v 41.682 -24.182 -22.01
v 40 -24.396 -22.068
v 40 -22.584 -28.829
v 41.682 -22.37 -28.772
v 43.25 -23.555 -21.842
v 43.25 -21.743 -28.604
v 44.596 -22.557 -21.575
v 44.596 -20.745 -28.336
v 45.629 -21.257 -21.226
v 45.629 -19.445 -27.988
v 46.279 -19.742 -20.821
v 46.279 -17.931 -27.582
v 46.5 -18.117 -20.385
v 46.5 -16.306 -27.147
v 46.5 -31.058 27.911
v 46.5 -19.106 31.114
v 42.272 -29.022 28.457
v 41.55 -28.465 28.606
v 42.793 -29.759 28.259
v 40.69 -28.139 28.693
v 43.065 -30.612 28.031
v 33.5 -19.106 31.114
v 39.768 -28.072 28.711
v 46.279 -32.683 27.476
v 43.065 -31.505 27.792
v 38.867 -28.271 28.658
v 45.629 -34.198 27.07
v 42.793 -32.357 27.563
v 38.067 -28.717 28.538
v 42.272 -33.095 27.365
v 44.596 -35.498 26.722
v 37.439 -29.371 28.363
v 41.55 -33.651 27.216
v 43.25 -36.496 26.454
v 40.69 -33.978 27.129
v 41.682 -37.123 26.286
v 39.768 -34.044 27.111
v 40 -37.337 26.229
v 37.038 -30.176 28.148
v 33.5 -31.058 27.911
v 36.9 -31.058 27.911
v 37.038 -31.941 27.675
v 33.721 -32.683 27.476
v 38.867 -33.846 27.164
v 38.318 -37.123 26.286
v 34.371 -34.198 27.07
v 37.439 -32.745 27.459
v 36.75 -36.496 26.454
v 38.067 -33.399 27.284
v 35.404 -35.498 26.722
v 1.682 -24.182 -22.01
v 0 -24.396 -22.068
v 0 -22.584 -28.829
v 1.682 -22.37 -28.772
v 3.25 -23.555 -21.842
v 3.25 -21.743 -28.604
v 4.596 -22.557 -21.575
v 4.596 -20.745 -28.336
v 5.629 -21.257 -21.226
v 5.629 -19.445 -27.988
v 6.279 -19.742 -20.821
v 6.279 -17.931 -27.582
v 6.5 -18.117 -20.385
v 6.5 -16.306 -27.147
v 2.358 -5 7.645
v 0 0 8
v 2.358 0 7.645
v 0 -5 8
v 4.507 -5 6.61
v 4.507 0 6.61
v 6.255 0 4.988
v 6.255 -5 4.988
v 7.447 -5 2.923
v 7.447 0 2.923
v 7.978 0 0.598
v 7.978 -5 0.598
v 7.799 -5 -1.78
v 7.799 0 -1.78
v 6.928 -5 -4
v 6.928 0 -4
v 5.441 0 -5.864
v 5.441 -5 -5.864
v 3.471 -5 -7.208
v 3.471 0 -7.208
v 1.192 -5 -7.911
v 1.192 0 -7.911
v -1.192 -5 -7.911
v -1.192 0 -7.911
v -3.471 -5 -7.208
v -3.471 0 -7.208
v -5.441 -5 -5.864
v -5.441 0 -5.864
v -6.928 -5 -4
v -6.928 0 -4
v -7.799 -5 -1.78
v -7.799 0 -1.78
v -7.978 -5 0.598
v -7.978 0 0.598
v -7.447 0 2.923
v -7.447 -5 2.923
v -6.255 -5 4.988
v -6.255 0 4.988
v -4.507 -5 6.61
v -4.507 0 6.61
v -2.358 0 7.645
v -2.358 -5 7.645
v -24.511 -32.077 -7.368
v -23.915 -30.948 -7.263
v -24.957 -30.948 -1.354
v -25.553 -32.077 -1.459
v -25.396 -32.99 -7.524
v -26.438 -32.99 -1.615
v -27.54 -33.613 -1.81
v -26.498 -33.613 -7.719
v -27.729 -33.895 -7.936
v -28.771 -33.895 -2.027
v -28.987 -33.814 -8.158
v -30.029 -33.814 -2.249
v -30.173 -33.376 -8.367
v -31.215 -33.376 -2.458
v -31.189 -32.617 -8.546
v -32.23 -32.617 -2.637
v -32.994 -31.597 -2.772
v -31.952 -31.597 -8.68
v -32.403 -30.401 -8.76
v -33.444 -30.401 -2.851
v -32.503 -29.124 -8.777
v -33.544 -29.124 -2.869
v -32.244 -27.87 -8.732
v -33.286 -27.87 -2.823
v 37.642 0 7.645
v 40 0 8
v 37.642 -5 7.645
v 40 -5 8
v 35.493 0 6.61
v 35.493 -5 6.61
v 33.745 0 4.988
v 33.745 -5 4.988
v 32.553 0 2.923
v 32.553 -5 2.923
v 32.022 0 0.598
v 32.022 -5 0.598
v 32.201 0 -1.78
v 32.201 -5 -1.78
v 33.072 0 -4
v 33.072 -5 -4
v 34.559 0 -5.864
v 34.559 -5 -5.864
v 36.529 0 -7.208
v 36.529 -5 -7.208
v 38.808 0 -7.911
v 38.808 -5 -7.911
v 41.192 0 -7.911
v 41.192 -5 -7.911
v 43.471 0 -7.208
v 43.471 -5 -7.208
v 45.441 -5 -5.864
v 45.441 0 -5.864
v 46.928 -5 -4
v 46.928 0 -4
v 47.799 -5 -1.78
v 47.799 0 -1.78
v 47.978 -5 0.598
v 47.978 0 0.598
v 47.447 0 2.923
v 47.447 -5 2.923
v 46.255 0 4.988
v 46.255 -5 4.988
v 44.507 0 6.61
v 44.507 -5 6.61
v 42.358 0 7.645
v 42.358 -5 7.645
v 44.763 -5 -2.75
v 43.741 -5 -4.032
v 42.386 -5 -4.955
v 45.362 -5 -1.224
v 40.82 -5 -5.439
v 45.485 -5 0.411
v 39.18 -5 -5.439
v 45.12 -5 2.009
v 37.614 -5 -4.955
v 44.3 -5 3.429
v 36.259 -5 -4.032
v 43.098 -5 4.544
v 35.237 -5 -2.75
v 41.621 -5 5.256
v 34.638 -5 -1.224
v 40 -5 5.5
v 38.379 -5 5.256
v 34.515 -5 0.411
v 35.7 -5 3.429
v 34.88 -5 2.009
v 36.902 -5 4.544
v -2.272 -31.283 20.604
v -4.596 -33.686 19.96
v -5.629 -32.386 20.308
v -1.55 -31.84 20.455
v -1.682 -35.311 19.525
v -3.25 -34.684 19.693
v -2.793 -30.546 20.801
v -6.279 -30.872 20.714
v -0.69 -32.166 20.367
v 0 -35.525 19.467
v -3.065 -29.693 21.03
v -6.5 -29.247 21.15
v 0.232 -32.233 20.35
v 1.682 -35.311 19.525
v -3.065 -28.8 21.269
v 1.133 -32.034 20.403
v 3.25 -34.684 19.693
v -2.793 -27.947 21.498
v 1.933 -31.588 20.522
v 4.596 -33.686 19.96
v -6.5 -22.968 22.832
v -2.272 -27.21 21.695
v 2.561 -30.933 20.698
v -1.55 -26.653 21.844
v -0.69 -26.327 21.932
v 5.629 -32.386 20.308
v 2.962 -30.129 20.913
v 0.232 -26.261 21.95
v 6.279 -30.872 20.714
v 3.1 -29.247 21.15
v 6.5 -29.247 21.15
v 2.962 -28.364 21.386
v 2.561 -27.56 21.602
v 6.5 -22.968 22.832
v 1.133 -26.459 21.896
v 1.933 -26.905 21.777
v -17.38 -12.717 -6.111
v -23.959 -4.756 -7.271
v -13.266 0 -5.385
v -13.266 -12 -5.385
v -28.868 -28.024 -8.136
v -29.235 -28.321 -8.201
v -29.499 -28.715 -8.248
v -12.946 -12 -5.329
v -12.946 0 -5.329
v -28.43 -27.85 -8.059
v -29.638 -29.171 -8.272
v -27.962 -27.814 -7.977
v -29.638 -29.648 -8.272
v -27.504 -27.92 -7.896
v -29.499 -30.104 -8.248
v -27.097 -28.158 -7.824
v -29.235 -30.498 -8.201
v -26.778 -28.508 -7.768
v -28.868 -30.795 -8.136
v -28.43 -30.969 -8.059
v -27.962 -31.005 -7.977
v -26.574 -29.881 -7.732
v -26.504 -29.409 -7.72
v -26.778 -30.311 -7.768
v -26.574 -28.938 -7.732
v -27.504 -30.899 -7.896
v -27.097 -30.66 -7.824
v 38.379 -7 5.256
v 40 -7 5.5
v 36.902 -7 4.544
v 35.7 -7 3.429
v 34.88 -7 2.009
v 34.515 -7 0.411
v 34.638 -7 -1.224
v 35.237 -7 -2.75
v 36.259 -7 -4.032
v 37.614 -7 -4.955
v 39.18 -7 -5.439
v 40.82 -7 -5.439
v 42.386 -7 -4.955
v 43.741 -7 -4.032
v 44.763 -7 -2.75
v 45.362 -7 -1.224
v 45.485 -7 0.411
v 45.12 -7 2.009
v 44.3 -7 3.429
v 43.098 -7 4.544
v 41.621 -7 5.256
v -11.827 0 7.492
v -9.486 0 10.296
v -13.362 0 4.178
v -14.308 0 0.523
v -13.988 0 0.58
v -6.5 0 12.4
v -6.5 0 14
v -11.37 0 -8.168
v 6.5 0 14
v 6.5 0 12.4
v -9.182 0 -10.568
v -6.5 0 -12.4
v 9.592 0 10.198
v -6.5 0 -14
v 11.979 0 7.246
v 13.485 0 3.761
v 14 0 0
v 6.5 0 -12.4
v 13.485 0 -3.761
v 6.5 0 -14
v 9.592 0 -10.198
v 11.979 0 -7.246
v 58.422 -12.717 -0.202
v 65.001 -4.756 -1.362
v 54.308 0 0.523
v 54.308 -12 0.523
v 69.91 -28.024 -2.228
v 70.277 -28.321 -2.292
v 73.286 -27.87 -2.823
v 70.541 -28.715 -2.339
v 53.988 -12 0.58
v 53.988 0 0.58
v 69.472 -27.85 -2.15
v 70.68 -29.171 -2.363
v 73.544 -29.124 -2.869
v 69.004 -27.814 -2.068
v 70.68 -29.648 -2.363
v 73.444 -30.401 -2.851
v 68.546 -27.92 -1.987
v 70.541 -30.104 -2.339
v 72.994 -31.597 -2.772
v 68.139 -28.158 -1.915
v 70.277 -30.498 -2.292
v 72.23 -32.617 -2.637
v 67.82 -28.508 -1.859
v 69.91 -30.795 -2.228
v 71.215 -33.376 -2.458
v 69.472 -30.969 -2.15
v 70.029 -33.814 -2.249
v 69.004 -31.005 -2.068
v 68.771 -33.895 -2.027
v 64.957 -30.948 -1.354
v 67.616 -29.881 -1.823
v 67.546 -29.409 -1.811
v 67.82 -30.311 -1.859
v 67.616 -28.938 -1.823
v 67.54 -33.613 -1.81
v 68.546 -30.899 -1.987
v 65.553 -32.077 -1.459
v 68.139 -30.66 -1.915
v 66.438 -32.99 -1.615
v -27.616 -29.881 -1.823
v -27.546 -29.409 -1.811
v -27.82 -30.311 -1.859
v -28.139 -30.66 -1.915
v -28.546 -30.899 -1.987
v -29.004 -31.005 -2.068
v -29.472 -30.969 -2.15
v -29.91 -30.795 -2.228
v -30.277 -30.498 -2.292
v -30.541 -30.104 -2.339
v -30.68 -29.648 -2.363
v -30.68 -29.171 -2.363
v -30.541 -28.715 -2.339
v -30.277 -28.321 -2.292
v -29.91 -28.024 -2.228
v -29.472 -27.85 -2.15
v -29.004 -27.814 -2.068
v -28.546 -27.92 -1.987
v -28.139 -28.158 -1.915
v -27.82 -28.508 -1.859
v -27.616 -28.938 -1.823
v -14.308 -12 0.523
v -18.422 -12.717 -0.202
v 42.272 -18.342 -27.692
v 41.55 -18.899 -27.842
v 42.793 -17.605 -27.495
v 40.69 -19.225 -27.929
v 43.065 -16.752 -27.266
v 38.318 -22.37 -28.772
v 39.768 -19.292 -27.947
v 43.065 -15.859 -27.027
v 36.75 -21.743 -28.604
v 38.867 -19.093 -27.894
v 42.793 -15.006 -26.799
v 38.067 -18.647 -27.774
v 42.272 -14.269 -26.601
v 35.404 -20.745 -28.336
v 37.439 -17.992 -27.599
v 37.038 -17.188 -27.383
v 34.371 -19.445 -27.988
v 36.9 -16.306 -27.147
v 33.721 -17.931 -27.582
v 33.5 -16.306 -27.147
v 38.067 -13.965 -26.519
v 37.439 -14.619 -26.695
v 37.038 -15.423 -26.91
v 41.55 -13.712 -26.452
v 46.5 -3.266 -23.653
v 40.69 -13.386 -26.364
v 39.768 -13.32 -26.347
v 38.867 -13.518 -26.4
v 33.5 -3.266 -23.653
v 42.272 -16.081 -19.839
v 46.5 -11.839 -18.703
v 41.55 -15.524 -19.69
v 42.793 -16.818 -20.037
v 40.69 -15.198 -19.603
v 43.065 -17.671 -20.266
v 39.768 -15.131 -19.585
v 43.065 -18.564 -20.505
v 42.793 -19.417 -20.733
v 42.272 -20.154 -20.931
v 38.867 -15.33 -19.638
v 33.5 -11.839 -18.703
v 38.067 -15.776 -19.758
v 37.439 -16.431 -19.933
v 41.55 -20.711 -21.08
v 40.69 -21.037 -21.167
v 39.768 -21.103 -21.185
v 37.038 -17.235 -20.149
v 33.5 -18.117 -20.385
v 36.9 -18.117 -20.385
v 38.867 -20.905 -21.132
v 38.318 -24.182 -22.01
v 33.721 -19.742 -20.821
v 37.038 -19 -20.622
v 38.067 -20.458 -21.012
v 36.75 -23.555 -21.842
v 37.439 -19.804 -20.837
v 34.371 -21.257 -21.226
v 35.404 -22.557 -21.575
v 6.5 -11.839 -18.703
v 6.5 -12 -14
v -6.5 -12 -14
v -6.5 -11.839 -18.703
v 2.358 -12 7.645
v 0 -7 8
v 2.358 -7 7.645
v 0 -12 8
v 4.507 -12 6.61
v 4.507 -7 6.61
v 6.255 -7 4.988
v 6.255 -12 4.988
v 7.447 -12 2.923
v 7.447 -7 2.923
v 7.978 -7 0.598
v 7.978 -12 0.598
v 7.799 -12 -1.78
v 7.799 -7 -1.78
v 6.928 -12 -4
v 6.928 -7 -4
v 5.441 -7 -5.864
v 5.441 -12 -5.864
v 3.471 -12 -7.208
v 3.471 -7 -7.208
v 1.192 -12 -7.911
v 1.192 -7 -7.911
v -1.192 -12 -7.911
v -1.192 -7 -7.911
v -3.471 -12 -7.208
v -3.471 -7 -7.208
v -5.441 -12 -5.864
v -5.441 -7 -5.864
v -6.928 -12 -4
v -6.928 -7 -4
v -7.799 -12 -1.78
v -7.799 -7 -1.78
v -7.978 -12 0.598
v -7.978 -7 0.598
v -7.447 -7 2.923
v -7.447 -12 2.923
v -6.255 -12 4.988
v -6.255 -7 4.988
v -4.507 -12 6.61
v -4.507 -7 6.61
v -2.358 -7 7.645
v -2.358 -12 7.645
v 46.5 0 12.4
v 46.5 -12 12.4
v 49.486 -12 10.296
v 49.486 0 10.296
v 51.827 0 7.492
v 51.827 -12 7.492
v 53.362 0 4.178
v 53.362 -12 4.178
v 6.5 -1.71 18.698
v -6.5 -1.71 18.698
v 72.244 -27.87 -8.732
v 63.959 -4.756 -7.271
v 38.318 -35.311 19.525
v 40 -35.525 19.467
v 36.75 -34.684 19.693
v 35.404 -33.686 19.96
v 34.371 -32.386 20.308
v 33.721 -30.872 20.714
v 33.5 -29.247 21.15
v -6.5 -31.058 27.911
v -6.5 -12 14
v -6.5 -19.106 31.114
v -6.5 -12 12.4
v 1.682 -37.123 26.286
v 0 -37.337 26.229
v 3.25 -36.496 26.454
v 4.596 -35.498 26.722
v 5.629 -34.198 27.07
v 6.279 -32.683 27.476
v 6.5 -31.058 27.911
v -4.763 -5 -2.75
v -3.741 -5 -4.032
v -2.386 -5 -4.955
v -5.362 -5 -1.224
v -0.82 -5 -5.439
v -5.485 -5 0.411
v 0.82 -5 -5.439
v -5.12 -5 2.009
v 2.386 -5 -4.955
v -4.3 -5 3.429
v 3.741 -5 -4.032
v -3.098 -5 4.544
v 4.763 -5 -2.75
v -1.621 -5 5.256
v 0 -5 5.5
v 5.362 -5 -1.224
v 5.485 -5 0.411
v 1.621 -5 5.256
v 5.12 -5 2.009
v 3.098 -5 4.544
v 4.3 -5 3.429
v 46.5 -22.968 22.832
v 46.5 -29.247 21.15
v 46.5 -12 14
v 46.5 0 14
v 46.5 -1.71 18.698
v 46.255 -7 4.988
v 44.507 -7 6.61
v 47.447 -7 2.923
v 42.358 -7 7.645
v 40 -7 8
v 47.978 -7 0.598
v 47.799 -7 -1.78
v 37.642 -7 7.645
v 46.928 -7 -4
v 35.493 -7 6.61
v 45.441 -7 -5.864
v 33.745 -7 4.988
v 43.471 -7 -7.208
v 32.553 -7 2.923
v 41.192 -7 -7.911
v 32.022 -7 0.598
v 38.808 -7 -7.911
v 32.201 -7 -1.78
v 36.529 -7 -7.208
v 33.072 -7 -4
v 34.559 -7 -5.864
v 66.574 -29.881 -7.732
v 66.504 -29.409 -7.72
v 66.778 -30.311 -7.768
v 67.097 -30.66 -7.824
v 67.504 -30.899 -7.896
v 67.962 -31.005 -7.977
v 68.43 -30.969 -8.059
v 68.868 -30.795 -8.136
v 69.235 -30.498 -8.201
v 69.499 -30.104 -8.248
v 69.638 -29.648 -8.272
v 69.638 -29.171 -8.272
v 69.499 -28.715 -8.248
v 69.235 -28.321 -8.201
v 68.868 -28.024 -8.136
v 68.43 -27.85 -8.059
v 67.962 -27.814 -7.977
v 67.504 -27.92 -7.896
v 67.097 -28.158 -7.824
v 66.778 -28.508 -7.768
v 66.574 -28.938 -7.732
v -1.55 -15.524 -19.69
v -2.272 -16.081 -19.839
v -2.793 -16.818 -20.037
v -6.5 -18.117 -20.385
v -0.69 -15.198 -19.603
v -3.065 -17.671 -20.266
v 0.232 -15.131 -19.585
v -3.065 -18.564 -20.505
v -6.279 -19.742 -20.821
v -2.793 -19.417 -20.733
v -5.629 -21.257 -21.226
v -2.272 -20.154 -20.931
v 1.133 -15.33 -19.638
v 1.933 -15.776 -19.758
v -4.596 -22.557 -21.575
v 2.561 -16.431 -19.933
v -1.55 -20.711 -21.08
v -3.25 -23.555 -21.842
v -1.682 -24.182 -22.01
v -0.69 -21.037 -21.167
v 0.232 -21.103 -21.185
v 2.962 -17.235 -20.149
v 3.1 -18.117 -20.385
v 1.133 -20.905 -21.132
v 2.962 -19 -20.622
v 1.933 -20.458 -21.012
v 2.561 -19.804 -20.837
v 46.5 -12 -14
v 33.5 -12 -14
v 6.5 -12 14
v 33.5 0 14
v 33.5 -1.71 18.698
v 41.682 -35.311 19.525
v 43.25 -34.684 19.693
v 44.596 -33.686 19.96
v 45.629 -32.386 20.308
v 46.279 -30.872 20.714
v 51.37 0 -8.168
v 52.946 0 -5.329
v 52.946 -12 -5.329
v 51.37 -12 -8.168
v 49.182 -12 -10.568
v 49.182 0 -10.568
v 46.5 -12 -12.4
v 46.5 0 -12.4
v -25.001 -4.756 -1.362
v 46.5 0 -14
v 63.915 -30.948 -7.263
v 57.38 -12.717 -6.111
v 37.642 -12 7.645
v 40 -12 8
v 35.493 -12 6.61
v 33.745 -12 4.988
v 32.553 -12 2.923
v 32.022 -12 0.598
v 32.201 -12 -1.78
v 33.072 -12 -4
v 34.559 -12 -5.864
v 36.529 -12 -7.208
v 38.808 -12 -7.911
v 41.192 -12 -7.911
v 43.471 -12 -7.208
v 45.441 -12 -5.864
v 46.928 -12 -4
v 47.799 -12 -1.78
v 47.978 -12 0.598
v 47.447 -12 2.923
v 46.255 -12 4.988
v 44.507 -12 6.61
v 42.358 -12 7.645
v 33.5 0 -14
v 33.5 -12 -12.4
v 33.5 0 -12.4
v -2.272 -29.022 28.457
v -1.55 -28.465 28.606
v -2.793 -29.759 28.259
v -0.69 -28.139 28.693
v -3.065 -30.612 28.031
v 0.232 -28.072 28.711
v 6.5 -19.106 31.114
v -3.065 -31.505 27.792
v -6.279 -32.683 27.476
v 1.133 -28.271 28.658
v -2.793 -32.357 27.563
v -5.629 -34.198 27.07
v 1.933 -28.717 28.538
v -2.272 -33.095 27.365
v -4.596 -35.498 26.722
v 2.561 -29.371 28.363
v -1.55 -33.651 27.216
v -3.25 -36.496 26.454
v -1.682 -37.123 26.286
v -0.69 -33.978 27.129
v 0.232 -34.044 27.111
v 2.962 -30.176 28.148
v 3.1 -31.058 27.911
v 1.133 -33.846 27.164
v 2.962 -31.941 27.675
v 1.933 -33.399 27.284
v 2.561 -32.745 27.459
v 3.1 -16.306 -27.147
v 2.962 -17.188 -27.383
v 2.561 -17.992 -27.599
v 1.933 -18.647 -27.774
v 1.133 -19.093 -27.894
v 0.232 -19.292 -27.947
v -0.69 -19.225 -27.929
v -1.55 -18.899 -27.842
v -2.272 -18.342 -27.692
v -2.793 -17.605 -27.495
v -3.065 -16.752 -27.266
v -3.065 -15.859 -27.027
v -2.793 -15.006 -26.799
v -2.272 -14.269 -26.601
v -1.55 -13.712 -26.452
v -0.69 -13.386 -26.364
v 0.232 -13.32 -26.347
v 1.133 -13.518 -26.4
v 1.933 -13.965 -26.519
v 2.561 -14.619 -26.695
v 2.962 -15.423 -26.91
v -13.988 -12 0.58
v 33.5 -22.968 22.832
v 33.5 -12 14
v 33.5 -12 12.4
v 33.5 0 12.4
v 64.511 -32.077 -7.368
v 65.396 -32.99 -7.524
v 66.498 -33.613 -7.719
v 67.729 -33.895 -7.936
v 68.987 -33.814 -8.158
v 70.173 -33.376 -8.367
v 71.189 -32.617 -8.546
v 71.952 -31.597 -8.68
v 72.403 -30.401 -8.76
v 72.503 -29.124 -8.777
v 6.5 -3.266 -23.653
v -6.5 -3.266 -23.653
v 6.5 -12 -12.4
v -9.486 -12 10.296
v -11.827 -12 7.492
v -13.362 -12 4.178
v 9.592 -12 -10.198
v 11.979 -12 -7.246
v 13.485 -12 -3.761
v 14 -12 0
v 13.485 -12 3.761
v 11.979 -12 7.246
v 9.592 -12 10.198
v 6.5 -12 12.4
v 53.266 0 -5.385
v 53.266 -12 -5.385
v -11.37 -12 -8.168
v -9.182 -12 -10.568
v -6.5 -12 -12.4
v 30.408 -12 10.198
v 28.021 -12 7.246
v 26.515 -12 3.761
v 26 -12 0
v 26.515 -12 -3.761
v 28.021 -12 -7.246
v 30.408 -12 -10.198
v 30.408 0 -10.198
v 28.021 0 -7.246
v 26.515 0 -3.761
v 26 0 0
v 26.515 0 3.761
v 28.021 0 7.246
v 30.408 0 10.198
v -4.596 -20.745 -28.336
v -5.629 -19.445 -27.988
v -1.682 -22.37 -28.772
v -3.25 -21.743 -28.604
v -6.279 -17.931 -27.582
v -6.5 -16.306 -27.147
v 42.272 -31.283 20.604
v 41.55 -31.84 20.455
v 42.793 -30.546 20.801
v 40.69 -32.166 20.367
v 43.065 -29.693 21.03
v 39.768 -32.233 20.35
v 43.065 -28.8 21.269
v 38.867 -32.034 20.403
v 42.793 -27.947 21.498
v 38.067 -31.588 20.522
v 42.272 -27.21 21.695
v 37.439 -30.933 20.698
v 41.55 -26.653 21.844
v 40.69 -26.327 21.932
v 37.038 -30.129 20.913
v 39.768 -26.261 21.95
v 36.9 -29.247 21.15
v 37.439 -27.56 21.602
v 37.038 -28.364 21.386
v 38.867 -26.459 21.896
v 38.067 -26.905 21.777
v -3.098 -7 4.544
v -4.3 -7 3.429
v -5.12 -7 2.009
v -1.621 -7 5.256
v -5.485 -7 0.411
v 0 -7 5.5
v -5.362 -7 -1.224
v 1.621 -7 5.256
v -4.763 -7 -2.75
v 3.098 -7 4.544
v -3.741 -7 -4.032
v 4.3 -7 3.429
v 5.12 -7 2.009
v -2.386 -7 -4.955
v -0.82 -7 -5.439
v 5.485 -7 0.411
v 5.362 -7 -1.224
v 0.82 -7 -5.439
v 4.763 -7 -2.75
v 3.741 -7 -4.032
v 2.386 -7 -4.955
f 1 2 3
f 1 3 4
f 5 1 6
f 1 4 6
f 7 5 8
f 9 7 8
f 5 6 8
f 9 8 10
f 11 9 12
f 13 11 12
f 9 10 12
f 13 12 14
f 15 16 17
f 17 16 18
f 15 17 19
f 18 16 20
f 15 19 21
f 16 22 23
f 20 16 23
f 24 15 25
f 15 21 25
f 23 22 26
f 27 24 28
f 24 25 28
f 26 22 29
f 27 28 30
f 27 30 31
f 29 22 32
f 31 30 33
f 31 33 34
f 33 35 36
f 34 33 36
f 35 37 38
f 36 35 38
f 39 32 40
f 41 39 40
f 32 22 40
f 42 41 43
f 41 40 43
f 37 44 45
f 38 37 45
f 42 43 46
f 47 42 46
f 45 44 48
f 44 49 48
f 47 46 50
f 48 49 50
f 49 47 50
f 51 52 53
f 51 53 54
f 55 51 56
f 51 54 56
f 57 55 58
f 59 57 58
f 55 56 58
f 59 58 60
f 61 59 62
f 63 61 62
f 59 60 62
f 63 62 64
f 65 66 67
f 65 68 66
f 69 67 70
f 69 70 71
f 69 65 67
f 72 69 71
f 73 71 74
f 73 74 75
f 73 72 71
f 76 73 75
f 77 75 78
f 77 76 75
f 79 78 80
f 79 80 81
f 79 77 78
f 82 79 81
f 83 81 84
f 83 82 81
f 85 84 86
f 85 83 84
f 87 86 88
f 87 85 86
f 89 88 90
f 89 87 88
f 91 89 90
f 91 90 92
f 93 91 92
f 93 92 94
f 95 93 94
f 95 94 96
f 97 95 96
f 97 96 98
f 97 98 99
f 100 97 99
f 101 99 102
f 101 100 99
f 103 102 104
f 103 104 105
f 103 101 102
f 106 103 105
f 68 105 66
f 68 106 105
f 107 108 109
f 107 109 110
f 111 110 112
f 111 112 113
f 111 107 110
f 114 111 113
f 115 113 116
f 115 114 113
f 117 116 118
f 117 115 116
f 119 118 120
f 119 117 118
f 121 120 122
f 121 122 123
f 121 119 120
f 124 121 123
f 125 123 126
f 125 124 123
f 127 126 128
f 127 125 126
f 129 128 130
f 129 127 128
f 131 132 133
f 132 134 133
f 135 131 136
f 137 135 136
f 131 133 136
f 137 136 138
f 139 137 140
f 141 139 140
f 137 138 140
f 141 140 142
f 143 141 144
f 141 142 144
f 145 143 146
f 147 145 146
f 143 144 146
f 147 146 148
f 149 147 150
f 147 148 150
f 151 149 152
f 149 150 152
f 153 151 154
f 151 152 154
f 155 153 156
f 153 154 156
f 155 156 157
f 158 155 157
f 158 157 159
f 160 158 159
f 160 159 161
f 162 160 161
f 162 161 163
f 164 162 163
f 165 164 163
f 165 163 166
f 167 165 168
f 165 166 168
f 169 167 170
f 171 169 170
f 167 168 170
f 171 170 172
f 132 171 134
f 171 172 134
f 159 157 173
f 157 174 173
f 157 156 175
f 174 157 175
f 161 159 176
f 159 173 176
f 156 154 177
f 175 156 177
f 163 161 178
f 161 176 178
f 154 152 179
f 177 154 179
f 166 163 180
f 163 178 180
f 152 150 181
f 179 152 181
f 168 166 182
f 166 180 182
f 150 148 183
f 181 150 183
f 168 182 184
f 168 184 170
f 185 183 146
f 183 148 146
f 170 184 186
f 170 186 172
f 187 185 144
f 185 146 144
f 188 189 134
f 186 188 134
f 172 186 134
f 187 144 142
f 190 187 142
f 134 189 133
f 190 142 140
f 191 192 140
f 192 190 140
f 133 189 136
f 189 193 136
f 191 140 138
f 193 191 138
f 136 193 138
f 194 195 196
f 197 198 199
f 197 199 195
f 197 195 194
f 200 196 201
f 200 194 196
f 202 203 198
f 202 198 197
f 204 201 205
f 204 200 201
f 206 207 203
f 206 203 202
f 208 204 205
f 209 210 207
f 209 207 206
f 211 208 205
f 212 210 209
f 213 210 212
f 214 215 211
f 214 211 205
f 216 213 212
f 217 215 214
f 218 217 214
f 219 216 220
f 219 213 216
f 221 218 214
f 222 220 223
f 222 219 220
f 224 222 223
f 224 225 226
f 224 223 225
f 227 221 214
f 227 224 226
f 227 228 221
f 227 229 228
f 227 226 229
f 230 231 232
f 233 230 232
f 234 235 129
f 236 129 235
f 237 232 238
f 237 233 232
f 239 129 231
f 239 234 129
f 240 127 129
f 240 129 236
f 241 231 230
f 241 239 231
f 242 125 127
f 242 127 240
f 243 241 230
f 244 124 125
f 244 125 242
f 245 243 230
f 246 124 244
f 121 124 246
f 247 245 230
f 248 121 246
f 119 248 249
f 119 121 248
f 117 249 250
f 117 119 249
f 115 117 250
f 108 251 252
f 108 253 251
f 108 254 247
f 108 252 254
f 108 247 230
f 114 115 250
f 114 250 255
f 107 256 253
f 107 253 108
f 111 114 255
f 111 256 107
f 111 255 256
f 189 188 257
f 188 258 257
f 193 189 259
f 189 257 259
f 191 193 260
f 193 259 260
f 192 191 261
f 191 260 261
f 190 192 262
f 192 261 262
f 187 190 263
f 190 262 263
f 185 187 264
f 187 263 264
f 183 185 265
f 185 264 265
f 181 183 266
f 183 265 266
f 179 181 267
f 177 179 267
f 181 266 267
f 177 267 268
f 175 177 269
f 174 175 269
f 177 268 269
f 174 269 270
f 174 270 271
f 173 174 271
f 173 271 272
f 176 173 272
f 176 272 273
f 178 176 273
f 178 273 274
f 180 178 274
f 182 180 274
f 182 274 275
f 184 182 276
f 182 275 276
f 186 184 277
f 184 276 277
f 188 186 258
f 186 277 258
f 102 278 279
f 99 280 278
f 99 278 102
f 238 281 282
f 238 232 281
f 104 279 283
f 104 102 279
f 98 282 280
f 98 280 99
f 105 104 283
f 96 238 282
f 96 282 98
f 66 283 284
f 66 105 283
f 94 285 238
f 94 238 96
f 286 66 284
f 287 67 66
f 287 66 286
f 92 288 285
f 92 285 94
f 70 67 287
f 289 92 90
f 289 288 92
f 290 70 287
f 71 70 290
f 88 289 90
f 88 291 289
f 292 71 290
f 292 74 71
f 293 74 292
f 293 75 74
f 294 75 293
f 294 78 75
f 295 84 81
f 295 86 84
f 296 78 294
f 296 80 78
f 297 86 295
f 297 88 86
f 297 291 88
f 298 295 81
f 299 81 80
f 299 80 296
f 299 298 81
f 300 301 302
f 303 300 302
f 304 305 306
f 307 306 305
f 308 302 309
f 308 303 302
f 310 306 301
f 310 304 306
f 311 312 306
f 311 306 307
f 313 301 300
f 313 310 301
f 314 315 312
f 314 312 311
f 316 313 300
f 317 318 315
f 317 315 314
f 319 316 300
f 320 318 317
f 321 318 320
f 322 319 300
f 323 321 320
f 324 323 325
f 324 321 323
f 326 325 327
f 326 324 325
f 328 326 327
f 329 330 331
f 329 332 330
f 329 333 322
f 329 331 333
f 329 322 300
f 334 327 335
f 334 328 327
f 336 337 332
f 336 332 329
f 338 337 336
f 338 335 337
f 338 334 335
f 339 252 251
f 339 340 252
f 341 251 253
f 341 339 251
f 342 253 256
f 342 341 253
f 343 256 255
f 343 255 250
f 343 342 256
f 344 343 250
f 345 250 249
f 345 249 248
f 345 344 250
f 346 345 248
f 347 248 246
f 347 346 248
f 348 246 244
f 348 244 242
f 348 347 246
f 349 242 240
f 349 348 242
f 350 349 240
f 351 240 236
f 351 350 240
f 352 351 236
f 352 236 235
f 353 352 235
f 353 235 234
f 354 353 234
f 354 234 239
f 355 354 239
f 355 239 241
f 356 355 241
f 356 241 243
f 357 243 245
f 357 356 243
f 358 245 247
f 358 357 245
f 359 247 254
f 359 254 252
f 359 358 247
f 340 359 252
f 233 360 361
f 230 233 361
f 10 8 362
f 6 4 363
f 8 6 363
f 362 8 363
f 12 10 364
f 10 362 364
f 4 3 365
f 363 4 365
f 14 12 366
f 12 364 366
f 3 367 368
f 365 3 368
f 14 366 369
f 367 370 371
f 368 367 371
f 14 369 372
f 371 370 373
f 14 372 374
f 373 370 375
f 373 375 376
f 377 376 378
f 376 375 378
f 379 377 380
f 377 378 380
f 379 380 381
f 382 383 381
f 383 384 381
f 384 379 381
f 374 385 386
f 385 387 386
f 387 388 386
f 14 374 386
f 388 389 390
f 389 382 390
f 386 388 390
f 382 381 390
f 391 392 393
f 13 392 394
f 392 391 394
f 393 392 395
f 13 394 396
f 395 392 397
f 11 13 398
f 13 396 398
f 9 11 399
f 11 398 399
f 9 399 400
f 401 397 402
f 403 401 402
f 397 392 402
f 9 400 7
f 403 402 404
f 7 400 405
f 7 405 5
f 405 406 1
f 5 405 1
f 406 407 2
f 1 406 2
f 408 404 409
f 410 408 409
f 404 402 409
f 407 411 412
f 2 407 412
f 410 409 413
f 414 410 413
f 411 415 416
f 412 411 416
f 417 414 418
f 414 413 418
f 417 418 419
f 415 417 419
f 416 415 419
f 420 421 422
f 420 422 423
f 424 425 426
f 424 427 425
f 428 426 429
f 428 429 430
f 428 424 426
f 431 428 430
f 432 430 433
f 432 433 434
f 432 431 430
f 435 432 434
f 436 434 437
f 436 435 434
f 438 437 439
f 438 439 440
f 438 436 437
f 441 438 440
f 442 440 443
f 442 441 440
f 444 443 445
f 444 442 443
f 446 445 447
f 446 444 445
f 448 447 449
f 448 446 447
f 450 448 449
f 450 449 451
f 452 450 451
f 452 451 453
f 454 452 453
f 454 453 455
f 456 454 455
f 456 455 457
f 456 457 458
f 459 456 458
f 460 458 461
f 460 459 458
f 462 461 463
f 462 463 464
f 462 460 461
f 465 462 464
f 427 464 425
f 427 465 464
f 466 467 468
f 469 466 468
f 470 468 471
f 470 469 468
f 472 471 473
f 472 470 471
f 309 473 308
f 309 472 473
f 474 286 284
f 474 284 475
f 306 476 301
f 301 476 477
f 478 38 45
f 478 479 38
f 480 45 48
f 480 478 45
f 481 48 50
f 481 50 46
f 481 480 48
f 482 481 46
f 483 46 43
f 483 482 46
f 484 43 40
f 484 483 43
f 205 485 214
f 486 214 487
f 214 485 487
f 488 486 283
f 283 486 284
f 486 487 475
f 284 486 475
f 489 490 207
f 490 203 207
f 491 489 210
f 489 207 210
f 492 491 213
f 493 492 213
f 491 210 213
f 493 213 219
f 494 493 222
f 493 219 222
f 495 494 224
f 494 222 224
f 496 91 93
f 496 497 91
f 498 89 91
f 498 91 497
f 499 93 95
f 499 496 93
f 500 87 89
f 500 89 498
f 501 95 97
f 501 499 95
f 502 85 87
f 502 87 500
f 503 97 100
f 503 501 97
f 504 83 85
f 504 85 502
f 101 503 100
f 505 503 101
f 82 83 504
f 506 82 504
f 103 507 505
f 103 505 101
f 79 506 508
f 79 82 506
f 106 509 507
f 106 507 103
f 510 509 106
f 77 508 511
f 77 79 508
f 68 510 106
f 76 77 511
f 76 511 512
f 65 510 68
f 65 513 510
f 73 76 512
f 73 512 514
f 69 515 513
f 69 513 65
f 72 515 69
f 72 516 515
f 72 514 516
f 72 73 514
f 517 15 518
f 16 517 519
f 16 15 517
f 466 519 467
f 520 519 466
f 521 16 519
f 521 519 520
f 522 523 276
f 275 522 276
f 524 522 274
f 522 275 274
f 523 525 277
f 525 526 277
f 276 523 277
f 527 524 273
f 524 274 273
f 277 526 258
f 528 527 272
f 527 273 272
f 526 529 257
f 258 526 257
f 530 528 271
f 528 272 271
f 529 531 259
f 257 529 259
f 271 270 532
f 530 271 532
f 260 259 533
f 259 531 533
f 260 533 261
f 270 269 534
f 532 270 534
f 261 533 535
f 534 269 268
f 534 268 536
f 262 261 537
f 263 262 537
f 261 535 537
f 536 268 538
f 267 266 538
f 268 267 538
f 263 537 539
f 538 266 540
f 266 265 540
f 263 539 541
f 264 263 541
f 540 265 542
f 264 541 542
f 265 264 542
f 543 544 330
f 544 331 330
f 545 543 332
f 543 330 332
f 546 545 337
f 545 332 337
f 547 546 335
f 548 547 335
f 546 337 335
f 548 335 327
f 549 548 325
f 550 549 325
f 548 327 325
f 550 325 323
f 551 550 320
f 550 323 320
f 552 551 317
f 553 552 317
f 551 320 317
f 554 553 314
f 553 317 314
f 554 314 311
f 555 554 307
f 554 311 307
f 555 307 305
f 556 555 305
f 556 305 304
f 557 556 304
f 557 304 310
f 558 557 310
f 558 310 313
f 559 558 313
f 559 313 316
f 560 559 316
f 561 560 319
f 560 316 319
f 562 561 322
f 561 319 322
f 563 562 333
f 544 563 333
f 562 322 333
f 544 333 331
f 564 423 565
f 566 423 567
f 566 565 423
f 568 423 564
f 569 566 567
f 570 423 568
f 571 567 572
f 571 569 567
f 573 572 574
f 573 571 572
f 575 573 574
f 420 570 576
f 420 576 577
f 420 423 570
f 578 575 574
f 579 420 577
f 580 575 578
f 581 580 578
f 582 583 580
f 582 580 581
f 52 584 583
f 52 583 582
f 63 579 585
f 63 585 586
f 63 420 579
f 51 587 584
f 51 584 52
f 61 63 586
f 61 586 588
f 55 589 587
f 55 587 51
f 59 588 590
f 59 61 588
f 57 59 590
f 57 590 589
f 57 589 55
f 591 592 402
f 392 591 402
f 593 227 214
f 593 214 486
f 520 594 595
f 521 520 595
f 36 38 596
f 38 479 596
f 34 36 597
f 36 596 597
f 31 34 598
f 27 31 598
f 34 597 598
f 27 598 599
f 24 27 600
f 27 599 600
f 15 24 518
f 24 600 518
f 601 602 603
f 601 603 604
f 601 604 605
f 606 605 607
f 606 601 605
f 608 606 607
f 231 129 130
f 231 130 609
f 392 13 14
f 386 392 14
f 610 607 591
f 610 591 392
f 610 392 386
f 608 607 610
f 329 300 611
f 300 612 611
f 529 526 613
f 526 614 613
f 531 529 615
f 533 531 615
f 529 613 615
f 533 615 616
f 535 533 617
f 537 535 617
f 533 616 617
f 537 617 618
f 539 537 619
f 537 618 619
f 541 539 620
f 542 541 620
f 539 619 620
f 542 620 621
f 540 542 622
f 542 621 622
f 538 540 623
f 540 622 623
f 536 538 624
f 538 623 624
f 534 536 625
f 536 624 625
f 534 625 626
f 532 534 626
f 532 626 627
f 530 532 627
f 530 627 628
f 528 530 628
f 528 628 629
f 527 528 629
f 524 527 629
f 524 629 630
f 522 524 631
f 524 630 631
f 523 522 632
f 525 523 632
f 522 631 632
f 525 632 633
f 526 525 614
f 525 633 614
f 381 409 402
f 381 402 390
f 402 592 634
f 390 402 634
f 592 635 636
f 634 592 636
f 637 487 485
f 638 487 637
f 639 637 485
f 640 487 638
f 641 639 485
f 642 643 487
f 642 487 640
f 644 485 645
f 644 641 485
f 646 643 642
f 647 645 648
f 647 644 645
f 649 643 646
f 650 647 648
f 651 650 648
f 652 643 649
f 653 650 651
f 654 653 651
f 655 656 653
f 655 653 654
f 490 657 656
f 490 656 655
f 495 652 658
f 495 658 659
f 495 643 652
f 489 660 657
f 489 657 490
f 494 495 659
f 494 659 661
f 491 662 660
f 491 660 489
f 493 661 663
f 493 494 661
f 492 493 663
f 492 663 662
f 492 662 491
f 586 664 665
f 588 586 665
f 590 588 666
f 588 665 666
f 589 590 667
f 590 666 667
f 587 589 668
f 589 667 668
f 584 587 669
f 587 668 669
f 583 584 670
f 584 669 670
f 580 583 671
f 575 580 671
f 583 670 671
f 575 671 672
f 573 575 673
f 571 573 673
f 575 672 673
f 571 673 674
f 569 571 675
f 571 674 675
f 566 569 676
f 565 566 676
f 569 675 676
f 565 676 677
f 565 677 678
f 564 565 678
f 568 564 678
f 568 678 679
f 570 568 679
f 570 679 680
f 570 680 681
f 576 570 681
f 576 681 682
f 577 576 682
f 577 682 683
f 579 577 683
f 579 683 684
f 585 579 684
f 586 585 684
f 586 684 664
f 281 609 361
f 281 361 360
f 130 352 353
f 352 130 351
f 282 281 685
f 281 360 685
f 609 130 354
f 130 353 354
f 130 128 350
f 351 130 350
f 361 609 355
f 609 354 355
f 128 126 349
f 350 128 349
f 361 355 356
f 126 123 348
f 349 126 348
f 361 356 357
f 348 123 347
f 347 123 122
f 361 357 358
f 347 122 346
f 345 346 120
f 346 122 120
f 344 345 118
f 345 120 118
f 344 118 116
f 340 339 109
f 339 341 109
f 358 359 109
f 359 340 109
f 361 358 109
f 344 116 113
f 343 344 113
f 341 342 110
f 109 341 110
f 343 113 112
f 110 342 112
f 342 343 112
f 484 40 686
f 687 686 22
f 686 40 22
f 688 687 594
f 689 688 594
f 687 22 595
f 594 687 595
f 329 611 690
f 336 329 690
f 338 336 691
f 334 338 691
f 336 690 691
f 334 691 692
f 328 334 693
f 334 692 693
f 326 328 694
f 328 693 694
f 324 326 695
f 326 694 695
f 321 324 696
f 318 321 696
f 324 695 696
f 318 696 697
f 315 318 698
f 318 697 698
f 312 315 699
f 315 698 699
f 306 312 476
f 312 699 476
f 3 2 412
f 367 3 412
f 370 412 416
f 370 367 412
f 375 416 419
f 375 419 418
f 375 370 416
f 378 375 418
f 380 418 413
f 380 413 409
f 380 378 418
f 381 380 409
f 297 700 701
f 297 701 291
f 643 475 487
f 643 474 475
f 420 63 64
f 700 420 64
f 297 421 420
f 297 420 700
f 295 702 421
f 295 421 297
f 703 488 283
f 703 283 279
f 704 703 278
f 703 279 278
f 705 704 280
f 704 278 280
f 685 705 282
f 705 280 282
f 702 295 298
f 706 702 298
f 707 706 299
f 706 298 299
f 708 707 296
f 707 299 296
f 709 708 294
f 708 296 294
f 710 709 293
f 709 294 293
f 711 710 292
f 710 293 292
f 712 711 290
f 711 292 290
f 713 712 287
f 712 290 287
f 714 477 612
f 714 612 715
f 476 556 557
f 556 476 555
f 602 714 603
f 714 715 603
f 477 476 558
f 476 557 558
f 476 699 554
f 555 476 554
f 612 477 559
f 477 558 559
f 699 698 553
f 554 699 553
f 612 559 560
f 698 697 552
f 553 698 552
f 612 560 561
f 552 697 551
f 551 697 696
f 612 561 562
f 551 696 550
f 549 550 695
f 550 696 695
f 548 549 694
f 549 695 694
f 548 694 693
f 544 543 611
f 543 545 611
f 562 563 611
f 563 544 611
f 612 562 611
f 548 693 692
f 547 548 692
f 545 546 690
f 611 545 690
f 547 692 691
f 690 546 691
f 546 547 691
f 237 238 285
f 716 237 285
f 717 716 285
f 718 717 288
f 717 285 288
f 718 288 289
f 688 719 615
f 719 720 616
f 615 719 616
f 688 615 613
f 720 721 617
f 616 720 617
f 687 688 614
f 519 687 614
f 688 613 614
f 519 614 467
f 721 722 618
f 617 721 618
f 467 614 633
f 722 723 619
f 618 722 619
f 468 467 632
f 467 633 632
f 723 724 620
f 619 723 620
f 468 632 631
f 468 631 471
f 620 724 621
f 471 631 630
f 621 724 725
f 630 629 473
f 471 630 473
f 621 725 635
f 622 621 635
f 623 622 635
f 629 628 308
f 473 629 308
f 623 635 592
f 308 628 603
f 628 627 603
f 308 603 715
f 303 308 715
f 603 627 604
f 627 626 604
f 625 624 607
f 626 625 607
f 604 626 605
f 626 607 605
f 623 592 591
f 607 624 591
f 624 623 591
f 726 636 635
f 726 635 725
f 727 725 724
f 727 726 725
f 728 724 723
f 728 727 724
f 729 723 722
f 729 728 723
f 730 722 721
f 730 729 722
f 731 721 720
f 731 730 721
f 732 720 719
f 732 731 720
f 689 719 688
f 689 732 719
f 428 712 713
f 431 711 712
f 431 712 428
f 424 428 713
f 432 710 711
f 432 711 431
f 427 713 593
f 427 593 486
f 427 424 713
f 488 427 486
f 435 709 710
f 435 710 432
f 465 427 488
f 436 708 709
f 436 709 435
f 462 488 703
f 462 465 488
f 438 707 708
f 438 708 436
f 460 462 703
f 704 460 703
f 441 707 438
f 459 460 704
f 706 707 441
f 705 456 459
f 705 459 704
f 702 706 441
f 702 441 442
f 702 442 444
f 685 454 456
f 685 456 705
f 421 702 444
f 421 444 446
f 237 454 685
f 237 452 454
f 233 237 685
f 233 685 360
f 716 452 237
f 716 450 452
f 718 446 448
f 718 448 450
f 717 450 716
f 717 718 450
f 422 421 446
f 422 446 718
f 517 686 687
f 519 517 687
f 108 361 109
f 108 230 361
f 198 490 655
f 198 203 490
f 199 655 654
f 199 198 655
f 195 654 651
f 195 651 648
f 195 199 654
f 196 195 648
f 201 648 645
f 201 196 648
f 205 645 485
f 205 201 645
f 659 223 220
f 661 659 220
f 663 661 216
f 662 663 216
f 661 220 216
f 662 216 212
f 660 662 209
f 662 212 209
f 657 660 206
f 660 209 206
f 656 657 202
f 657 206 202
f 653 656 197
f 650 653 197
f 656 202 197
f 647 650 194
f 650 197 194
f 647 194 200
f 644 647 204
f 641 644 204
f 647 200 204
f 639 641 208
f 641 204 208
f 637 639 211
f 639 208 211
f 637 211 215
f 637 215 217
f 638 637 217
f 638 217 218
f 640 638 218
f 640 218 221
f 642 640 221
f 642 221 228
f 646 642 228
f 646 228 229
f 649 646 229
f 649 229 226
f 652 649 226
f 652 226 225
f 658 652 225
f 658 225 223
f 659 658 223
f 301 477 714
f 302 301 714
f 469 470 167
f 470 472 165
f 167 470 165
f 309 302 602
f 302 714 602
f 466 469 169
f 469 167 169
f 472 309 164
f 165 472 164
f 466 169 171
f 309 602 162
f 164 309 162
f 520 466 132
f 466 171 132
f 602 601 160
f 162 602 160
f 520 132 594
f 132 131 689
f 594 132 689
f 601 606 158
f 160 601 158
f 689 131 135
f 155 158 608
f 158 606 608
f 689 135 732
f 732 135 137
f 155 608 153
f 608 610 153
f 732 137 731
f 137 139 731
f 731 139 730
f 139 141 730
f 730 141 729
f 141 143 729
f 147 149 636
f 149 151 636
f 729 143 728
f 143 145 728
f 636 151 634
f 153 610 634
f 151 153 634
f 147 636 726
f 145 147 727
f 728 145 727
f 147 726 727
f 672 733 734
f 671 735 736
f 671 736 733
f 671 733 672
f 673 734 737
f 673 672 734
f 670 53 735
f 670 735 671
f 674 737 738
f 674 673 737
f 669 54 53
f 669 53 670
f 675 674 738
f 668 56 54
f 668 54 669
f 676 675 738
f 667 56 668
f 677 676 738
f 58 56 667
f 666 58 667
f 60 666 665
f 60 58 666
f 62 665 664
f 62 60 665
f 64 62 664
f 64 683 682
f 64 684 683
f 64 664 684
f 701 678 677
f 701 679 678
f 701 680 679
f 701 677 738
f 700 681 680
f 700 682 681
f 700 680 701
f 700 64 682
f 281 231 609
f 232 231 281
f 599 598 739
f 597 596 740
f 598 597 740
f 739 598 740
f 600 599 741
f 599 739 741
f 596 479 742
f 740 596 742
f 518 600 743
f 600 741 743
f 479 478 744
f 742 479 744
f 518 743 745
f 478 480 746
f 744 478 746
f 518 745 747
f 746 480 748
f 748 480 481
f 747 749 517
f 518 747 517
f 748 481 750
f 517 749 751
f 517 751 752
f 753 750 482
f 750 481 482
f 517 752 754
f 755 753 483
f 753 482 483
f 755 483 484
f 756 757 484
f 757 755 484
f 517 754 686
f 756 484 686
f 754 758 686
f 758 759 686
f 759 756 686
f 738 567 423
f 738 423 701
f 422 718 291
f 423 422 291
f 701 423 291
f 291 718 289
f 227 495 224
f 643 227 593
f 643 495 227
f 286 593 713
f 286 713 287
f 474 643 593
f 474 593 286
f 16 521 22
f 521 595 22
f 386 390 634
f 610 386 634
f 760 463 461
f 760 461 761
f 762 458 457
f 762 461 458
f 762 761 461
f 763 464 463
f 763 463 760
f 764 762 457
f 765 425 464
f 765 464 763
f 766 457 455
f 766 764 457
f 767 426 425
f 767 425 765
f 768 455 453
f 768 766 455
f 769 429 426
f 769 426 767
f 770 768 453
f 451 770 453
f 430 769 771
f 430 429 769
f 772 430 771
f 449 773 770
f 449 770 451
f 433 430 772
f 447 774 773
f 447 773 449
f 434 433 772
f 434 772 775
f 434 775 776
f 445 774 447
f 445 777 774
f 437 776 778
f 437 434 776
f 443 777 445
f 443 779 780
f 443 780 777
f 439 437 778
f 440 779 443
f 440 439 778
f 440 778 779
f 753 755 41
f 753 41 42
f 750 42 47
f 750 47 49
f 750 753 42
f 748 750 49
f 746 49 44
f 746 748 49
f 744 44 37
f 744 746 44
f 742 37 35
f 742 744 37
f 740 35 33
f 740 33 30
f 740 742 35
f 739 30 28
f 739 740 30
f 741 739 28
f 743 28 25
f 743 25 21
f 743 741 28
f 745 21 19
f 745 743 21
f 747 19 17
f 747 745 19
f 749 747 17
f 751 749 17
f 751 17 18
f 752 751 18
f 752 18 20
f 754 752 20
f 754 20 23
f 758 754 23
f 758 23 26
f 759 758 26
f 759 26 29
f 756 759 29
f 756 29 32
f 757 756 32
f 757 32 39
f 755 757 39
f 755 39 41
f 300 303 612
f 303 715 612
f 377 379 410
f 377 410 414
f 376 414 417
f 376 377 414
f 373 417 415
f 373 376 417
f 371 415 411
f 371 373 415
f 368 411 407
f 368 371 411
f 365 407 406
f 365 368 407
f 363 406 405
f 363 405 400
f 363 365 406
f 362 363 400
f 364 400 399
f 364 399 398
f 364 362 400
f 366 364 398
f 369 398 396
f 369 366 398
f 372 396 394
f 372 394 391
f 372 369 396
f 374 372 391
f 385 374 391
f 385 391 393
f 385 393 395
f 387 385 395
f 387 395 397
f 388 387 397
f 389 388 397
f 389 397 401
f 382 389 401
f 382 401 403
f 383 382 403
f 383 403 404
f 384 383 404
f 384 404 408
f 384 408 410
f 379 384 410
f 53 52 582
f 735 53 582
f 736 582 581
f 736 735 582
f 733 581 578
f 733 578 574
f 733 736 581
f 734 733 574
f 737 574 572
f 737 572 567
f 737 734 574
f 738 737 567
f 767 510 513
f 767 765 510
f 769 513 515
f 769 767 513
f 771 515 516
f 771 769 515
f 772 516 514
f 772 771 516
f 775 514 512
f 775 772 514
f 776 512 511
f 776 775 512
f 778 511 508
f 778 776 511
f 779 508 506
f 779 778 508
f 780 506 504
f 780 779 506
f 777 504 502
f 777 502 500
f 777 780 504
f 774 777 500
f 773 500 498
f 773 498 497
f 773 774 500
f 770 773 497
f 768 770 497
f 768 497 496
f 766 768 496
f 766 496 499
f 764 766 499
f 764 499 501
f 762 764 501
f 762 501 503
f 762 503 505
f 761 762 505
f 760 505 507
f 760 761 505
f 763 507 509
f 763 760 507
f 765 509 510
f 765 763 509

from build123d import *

# Parameters (mm, degrees)
F0_R      = 14
F1_DEPTH  = 12
F3_DEPTH  = 6.5
F4_R      = 6.49999
F5_R      = 3.1
F6_DEPTH  = 61.7194243546
F9_R      = 1.6
F10_DEPTH = 3


# Not quite as in the source:
# - a fillet or chamfer is up to 0.001 mm smaller than in the source, because OpenCascade refuses the exact size


with BuildPart() as f1:
    # F0 (on Front) → F1 (new body)
    with BuildSketch(Plane.XZ):
        Circle(F0_R)
    extrude(amount=F1_DEPTH)

    # F2 (on Right) → F3 (join, symmetric)
    with BuildSketch(Plane.YZ):
        Polygon((-37.3368032832, 26.2287753615), (-35.5250699675, 19.4672945775), (-22.9680342257, 22.8319421638), (-12, 14), (-12, -14), (-11.8388152863, -18.7028683666), (-24.3958510281, -22.0675159529), (-22.5841177123, -28.828996737), (-3.2656011866, -23.6526158349), (0, -14), (0, 14), (-1.7101007166, 18.6984631039), (-19.1062115093, 31.1136477049), align=None)
    extrude(amount=F3_DEPTH, both=True)

    # F4 (radius 6.5 in the source; OpenCascade refuses exactly that, so slightly less here)
    f4_edges = [f1.edges().sort_by_distance(p)[0] for p in [
        (-6.5, -36.430937, 22.848035),
        (6.5, -36.430937, 22.848035),
        (-6.5, -23.489984, -25.448256),
        (6.5, -23.489984, -25.448256),
    ]]
    fillet(f4_edges, radius=F4_R)

    # F5 (on face) → F6 (cut, through all)
    with BuildSketch(Plane(origin=(0, 5.6944001585, -21.2517907103), x_dir=(1, 0, 0), z_dir=(0, 0.2588190451, -0.9659258263))):
        with Locations((0, 22.776075969)):
            Circle(F5_R)
    extrude(amount=-F6_DEPTH, mode=Mode.SUBTRACT)

    # F9 (on line) → F10 (join, symmetric)
    with BuildSketch(Plane(origin=(0, 0, 0), x_dir=(0.984807753, 0, 0.1736481777), z_dir=(0.1736481777, 0, -0.984807753))):
        with BuildLine():
            Line((-18.1775185709, 12.7166448356), (-24.8133673259, 30.9484894489))
            ThreePointArc((-24.8133673259, 30.9484894489), (-30.5810747644, 33.6380155974), (-33.270600913, 27.8703081589))
            Line((-33.270600913, 27.8703081589), (-24.8575633616, 4.7556774576))
            Line((-24.8575633616, 4.7556774576), (-14, 0))
            Line((-14, 0), (-3.9701759072, 0))
            Line((-3.9701759072, 0), (-3.9701759072, 12))
            Line((-3.9701759072, 12), (-14, 12))
            Line((-14, 12), (-18.1775185709, 12.7166448356))
        make_face()
        with Locations((-29.0419841195, 29.4093988039)):
            Circle(F9_R, mode=Mode.SUBTRACT)
    extrude(amount=F10_DEPTH, both=True)

    # F11 (on Right) → F12 (revolve, cut)
    with BuildSketch(Plane.YZ):
        Polygon((0, 0), (0, 8), (-5, 8), (-5, 5.5), (-7, 5.5), (-7, 8), (-12, 8), (-12, 0), align=None)
    revolve(axis=Axis((0, 2.6090382598, 0), (0, 1, 0)), mode=Mode.SUBTRACT)


with BuildPart() as f14_1:
    # F14: instance of F1
    add(f1.part.mirror(Plane.YZ.offset(20)))


solid = Compound([f1.part, f14_1.part])
